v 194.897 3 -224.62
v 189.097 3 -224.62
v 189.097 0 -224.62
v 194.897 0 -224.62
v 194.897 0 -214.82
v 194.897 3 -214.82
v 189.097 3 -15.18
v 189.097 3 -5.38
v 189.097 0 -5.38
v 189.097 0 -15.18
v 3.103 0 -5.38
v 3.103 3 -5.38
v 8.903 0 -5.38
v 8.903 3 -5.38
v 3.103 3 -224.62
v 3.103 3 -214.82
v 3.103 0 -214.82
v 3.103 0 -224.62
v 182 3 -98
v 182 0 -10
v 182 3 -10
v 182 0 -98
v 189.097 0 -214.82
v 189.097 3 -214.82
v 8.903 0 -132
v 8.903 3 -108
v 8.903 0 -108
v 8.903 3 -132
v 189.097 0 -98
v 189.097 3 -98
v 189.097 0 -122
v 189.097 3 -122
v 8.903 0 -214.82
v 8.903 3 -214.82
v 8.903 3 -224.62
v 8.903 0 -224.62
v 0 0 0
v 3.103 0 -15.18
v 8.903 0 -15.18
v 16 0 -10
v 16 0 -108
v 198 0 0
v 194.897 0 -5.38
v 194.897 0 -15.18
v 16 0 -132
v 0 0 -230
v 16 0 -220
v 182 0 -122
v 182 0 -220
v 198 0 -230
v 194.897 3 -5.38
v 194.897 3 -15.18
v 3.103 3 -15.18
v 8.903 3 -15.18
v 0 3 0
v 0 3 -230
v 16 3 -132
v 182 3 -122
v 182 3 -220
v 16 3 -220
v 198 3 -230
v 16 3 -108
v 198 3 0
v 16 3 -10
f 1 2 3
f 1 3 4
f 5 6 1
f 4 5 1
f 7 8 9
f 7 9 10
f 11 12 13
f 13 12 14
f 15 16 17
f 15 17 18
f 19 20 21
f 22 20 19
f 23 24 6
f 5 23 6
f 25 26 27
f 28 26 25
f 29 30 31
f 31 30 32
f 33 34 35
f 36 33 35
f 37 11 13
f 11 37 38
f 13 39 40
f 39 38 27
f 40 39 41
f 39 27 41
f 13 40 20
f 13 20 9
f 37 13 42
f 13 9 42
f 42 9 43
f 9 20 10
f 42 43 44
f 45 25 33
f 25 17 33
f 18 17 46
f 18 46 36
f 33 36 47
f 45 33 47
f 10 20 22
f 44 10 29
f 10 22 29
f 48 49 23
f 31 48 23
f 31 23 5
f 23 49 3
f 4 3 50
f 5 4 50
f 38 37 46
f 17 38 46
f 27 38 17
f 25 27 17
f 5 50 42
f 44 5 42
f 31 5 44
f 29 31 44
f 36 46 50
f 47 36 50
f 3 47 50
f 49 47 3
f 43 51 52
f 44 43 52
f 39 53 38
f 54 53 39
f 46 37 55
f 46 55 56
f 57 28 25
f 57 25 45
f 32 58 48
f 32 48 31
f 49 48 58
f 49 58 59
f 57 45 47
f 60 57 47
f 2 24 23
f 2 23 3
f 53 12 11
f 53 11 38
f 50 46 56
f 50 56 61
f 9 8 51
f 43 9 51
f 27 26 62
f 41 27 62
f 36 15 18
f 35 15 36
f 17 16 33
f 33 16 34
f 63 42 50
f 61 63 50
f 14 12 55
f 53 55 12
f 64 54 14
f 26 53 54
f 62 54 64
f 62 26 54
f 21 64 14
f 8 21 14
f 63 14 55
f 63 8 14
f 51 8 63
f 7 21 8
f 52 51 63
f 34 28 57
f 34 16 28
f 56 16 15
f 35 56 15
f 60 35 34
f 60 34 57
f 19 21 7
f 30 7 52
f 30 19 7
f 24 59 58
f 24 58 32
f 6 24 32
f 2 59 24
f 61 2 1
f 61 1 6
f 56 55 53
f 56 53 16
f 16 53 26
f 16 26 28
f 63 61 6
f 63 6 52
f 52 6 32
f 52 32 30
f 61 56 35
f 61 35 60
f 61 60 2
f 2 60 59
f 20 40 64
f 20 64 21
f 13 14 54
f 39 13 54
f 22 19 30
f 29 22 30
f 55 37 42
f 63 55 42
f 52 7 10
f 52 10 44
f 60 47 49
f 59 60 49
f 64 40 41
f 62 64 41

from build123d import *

# Parameters (mm, degrees)
SKETCH1_W           = 198
SKETCH1_H           = 230
SKETCH1_W_2         = 166
SKETCH1_H_2         = 210
BOSS_EXTRUDE1_DEPTH = 3
SKETCH2_W           = 7.09740754
SKETCH2_H           = 24
SKETCH2_W_2         = 5.8
SKETCH2_H_2         = 9.8
CUT_EXTRUDE1_DEPTH  = 3


with BuildPart() as part:
    # Sketch1 → Boss-Extrude1 (new body)
    with BuildSketch(Plane(origin=(0, 0, 0), x_dir=(1, 0, 0), z_dir=(0, 1, 0))):
        with Locations((99, 115)):
            Rectangle(SKETCH1_W, SKETCH1_H)
        with Locations((99, 115)):
            Rectangle(SKETCH1_W_2, SKETCH1_H_2, mode=Mode.SUBTRACT)
    extrude(amount=BOSS_EXTRUDE1_DEPTH)

    # Sketch2 → Cut-Extrude1 (cut)
    with BuildSketch(Plane(origin=(0, 3, 0), x_dir=(1, 0, 0), z_dir=(0, 1, 0))):
        with Locations((12.45129623, 120)):
            Rectangle(SKETCH2_W, SKETCH2_H)
        with Locations((191.99740754, 10.279523389)):
            Rectangle(SKETCH2_W_2, SKETCH2_H_2)
        with Locations((185.54870377, 110)):
            Rectangle(SKETCH2_W, SKETCH2_H)
        with Locations((191.99740754, 219.720476611)):
            Rectangle(SKETCH2_W_2, SKETCH2_H_2)
        with Locations((6.00259246, 219.720476611)):
            Rectangle(SKETCH2_W_2, SKETCH2_H_2)
        with Locations((6.00259246, 10.279523389)):
            Rectangle(SKETCH2_W_2, SKETCH2_H_2)
    extrude(amount=-CUT_EXTRUDE1_DEPTH, mode=Mode.SUBTRACT)


solid = part.part
